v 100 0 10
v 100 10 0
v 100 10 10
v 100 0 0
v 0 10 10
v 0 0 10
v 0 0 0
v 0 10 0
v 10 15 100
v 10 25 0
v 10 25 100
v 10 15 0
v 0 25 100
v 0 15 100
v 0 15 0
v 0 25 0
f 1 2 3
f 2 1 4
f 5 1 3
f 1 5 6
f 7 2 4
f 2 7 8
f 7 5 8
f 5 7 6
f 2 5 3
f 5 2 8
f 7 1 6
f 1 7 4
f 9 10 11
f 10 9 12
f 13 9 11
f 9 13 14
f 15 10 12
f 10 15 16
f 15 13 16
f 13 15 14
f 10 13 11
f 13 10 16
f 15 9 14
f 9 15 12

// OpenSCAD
cube([100, 10, 10]);
translate([0, 15, 0])
  cube([10, 10, 100]);
